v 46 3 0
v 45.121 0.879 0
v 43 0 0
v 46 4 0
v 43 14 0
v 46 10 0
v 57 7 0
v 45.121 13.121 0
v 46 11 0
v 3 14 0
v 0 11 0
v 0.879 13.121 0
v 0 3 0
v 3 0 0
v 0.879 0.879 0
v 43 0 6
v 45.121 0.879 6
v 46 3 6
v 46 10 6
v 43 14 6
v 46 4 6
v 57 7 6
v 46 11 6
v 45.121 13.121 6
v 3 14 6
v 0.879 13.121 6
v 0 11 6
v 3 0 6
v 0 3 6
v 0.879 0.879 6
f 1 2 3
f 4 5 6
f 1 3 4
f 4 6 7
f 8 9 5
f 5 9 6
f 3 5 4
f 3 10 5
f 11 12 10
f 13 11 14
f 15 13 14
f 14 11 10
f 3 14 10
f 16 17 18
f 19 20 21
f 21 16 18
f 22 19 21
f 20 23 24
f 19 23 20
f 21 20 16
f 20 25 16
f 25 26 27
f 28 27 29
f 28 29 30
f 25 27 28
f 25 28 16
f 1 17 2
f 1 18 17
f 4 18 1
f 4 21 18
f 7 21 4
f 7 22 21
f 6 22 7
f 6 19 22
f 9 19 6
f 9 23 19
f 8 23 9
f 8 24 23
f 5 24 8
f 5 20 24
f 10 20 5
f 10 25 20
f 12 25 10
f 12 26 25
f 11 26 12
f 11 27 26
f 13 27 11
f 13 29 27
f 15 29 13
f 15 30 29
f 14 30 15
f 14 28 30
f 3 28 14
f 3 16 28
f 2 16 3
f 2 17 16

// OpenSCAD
$fn = 32;

// ----------------------------------------------------------------------
// Ratchet pawl: 46 x 14 mm body, beak 11 mm с правого торца
// ----------------------------------------------------------------------

// --- parameters (mm) ---
profile_height = 6;       // extrusion height
profile_points = 15;      // points of the closed outline

profile = [[0, 3], [0.879, 0.879], [3, 0], [43, 0], [45.121, 0.879], [46, 3], [46, 4], [57, 7], [46, 10], [46, 11], [45.121, 13.121], [43, 14], [3, 14], [0.879, 13.121], [0, 11]];  // single closed polygon, 15 points, counter clockwise

// --- the one profile operation ---
linear_extrude(height = profile_height) polygon(points = profile);
